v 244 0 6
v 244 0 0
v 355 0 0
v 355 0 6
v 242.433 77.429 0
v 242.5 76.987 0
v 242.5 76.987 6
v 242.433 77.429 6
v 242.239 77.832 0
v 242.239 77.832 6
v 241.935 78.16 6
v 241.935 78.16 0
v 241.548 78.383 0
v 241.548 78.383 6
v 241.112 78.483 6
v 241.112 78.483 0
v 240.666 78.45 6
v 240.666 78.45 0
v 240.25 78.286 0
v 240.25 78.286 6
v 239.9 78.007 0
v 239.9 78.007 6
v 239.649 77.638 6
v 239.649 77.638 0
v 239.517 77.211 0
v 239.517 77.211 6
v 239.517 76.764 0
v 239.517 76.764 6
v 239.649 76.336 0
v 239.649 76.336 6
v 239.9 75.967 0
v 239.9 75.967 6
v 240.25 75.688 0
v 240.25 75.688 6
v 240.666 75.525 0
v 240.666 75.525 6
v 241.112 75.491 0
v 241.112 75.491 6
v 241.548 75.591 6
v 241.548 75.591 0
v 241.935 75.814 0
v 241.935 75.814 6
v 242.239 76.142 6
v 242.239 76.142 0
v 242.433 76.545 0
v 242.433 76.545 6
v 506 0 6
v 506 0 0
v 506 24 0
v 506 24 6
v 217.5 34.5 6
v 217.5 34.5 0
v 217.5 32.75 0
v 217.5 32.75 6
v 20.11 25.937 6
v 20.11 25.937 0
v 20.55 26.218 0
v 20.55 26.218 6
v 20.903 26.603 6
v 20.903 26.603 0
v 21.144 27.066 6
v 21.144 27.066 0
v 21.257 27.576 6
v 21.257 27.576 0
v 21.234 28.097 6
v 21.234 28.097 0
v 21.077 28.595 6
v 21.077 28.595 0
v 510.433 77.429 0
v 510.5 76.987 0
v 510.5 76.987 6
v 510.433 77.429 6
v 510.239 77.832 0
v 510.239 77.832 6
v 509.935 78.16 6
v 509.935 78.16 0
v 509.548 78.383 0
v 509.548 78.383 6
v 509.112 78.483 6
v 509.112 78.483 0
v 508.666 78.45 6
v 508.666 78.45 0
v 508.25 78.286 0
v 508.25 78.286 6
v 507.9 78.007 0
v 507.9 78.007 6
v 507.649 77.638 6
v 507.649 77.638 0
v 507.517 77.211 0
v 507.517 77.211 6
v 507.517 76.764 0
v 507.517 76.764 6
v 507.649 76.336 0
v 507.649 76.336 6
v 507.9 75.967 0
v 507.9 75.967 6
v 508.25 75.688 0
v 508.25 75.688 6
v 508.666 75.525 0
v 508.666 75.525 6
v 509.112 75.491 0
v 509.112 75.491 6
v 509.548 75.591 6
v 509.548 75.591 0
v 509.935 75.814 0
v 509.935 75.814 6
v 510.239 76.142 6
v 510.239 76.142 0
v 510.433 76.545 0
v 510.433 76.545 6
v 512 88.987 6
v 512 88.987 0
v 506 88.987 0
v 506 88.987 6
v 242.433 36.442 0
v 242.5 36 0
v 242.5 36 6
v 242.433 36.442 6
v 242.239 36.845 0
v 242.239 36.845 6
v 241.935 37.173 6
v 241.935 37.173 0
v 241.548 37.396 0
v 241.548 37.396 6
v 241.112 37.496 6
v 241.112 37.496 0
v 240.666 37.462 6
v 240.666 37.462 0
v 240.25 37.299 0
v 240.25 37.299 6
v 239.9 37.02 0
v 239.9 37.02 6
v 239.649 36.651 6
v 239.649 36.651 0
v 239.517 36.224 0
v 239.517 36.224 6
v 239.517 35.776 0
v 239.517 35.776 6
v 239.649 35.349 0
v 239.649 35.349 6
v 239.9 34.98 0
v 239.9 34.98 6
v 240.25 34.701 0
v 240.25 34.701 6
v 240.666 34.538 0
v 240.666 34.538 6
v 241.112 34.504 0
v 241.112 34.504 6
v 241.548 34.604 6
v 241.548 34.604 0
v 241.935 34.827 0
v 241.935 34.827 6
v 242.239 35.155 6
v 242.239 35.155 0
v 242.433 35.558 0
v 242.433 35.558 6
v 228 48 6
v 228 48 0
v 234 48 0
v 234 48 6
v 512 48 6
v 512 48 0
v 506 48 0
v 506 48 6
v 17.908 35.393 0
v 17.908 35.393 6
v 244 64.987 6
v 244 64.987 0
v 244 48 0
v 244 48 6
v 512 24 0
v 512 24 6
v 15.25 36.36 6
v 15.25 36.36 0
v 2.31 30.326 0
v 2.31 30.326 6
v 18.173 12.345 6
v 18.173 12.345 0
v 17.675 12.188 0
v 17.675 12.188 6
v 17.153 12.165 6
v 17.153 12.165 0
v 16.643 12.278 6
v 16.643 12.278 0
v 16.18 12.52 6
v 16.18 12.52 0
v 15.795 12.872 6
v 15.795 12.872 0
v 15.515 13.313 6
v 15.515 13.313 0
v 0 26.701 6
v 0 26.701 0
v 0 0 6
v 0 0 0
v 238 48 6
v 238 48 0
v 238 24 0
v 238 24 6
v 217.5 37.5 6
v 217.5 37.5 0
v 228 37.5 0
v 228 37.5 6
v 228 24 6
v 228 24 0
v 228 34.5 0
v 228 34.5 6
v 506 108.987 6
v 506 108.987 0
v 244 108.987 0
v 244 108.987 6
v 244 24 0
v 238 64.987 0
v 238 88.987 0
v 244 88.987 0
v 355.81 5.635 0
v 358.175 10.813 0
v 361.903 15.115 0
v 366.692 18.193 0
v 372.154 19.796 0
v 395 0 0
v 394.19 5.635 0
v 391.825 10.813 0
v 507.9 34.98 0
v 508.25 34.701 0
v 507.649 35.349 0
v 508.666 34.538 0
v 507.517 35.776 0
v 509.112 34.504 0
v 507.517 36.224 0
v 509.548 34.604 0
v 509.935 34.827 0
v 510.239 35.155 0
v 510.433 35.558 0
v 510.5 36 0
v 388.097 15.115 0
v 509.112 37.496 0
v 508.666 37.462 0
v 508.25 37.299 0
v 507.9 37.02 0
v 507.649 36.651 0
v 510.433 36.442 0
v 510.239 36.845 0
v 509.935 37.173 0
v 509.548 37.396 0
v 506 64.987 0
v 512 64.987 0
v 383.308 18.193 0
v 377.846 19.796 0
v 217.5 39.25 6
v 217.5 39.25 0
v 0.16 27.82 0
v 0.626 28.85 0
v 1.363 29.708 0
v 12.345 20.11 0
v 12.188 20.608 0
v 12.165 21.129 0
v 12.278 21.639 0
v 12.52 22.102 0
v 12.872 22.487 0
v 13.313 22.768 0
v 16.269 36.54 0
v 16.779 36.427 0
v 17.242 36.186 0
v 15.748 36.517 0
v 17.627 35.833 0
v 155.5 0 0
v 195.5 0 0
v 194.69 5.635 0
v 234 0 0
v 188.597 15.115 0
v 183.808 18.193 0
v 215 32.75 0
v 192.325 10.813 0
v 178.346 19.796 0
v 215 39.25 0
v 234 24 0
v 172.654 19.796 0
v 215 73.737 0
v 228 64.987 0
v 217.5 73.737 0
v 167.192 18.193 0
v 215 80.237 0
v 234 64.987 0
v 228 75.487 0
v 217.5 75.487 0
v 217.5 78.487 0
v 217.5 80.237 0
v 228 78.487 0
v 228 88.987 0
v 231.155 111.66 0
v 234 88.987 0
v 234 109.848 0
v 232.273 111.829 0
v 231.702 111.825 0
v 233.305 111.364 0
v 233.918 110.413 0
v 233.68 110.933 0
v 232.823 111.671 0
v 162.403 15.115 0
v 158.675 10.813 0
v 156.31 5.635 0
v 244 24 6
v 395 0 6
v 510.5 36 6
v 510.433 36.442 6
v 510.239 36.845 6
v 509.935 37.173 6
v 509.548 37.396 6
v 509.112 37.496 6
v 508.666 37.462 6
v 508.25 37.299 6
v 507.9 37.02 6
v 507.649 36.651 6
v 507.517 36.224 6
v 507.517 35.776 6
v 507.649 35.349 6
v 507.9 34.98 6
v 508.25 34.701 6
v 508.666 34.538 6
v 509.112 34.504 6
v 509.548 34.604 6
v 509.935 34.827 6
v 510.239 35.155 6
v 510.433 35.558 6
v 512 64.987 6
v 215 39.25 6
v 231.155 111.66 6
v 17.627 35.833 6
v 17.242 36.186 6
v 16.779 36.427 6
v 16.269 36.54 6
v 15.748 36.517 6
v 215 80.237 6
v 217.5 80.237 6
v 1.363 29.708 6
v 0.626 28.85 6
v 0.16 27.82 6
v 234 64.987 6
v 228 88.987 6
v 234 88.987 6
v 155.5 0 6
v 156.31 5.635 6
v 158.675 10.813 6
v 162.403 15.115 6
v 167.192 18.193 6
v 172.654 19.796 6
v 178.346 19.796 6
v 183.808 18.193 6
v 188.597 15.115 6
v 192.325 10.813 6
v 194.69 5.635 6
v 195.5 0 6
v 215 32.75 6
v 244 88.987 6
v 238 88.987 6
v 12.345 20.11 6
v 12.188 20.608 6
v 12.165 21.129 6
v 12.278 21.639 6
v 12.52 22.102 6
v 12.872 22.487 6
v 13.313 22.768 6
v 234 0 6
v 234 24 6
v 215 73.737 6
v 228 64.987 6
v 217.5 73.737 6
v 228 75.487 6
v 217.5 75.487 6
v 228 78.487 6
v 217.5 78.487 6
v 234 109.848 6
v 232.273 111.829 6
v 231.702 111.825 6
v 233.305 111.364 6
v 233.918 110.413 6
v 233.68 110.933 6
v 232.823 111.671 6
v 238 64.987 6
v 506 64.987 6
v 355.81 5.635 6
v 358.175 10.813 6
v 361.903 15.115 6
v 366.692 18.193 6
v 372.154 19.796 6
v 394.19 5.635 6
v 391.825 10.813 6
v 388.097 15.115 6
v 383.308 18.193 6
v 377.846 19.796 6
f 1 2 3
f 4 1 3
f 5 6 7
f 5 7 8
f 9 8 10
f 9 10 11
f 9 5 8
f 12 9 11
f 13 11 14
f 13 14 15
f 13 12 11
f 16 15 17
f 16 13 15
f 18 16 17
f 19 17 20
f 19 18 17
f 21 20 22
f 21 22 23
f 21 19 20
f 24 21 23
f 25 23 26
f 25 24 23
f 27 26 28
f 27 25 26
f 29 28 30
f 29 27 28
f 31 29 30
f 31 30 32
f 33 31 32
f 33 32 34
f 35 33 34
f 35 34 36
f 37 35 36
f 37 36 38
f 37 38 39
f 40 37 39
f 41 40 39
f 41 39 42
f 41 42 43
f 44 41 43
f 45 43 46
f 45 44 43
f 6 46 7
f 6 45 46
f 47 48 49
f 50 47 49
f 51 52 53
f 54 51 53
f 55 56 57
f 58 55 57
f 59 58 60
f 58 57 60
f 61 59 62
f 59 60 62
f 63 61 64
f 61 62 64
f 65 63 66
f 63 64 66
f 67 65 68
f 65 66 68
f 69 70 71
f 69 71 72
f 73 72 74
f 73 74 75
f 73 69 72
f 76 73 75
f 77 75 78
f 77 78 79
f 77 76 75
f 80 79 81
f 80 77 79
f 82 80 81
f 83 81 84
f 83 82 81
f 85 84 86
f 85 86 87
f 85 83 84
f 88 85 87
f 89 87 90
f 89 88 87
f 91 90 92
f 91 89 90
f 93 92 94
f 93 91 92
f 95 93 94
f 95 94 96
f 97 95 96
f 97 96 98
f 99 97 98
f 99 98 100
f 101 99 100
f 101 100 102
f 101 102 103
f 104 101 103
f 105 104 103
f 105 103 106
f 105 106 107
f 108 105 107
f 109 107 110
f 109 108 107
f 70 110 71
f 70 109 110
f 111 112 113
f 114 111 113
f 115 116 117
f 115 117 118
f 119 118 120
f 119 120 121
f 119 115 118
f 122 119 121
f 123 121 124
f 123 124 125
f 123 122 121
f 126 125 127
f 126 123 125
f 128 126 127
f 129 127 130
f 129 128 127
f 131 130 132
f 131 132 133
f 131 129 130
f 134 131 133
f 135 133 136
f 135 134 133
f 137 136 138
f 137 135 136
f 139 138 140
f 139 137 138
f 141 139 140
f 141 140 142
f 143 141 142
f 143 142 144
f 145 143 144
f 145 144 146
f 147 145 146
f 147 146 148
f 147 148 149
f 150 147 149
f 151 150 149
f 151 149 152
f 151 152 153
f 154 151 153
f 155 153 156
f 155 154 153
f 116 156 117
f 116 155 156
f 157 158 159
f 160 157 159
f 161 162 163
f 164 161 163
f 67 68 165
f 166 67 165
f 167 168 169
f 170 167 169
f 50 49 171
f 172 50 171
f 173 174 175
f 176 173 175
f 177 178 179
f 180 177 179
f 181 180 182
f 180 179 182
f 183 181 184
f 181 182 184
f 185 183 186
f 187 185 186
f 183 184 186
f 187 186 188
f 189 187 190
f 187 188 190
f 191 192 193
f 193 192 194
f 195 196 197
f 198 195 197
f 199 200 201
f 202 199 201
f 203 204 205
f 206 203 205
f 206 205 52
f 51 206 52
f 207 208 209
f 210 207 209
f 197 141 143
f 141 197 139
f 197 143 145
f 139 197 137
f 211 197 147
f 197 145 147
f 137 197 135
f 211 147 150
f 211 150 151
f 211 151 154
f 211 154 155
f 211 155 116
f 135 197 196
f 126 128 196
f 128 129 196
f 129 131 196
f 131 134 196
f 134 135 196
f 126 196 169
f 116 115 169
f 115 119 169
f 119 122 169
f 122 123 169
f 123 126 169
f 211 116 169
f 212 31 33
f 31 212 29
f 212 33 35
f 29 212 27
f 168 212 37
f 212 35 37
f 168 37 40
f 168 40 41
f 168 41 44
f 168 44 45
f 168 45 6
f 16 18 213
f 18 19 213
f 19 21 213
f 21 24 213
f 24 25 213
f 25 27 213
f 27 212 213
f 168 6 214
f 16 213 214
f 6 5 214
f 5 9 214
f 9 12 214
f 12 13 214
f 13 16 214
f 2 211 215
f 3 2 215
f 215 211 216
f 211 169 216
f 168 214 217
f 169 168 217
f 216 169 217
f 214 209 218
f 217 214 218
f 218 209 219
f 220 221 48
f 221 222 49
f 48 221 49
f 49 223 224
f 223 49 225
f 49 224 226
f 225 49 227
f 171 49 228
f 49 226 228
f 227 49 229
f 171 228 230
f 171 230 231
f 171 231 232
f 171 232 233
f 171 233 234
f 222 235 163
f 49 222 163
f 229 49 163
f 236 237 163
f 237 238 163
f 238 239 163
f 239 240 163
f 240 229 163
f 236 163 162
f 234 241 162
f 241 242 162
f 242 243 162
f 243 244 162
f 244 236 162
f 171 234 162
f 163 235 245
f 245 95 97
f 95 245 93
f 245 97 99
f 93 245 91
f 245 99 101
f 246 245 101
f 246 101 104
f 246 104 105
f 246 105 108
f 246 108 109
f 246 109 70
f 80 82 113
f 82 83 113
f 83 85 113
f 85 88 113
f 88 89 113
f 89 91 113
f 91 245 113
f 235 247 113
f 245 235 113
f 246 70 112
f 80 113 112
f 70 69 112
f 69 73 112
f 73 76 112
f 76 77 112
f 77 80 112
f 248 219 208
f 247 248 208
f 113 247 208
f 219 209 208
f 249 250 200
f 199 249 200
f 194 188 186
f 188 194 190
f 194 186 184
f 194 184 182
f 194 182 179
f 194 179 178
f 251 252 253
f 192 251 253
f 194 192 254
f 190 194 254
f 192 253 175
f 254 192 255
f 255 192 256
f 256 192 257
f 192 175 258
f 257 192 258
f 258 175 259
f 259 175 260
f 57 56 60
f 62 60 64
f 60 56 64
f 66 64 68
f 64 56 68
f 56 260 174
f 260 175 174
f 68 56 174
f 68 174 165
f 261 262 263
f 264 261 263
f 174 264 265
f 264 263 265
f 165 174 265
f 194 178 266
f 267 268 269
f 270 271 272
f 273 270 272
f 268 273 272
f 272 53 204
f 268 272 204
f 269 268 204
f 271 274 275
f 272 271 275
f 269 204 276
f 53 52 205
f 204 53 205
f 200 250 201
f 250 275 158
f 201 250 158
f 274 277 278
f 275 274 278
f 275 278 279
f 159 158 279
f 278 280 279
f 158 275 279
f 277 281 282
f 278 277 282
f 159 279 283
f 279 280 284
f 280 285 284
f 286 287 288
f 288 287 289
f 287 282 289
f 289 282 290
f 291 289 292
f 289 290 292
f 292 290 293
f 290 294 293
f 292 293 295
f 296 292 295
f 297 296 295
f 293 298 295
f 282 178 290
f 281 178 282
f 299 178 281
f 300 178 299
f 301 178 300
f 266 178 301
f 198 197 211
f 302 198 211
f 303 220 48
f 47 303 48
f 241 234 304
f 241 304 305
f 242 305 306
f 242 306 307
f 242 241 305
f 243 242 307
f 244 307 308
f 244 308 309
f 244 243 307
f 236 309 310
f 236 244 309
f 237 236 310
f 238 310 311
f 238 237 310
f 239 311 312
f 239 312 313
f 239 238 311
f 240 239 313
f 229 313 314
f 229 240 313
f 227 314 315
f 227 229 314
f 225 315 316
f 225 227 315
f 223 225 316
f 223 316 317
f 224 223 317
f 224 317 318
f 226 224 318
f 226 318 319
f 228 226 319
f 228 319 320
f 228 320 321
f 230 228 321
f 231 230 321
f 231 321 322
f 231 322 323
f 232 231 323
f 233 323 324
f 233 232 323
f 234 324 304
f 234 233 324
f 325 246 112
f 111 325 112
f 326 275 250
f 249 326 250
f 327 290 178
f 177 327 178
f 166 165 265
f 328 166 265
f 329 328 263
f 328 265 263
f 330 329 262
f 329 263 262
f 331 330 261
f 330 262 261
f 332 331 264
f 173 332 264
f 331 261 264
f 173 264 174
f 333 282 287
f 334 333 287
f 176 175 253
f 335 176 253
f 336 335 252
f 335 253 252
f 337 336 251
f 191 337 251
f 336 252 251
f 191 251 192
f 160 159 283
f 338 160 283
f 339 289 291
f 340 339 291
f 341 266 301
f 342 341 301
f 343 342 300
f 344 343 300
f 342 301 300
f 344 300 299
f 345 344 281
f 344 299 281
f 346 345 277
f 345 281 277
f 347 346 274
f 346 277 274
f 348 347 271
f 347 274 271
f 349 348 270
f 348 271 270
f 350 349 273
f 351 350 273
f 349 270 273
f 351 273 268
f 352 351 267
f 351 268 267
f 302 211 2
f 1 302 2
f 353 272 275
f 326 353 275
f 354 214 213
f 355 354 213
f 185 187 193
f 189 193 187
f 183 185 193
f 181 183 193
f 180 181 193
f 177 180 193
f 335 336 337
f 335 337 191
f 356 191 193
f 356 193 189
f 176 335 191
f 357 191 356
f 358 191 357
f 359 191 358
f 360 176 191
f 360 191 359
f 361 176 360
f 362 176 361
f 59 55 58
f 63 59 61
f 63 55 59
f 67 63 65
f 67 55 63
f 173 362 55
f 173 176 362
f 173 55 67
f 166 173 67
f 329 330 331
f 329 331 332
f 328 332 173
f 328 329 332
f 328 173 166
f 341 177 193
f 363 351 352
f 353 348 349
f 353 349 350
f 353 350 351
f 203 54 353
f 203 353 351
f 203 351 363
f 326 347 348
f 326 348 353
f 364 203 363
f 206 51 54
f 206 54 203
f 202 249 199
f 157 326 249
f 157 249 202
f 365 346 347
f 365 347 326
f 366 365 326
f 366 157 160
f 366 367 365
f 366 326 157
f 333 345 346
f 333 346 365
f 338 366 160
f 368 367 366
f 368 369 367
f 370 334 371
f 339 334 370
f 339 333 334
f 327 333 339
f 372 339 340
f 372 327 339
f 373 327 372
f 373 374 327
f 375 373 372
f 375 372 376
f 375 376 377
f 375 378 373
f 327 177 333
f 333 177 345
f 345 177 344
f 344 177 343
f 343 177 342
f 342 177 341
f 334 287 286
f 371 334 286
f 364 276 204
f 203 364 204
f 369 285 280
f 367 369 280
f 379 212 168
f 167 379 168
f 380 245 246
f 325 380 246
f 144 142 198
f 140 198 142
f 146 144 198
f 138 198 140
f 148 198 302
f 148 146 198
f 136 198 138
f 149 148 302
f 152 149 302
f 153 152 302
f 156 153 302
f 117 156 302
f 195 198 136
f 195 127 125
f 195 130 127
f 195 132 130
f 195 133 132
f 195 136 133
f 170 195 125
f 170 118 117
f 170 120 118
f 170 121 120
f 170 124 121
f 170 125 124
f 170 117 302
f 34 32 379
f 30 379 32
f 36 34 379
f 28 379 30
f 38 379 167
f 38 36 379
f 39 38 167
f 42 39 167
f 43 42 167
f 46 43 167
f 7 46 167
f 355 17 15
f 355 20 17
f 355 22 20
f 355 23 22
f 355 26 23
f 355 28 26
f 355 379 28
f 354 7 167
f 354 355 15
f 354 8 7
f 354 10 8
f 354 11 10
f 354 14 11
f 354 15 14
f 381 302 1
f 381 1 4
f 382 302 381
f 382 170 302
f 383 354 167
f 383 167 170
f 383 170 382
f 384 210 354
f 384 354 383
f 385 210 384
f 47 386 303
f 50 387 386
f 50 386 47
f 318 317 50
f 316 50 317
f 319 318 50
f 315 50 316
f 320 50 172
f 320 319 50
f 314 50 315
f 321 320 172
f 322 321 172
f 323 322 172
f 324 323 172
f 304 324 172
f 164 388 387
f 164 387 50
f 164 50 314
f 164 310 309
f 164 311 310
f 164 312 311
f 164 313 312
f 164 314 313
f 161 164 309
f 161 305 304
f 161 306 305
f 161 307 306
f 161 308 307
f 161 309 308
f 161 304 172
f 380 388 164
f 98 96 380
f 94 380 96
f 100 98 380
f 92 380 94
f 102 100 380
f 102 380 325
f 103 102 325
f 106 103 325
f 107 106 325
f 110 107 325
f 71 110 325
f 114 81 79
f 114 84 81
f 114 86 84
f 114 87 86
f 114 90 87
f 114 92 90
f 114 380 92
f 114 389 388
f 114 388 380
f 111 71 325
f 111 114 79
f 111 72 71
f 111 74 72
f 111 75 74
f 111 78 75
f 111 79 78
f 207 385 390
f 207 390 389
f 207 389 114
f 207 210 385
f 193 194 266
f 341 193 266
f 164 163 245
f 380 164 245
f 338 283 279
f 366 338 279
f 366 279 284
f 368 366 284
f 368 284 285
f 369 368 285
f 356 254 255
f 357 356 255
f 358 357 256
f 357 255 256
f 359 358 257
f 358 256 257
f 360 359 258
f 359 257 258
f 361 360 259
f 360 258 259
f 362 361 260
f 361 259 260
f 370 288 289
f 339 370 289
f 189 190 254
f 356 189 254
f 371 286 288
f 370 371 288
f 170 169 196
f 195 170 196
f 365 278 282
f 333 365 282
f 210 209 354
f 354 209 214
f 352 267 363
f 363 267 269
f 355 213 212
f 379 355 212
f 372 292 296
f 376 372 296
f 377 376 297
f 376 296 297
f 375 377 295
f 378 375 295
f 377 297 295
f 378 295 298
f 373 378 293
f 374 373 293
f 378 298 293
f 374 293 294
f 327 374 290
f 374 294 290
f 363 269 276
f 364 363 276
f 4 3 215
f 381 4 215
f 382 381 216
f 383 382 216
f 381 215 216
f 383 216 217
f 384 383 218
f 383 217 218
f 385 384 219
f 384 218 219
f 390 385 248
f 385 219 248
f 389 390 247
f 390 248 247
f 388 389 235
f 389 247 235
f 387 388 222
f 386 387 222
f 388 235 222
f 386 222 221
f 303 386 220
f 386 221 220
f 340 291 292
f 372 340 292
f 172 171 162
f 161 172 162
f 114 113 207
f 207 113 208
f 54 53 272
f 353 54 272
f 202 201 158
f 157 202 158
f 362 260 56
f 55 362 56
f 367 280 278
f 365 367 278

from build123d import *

# Parameters (mm, degrees)
F2_DEPTH = 6
F1_R     = 1.5


with BuildPart() as f2:
    # F1 (on Top) → F2 (new body)
    with BuildSketch(Plane.XY):
        with BuildLine():
            Line((13.3126155741, 22.7677760744), (20.1099239768, 25.9374130375))
            ThreePointArc((20.1099239768, 25.9374130375), (21.1440726949, 27.0659883249), (21.0773030274, 28.595265135))
            Line((21.0773030274, 28.595265135), (17.9076660644, 35.3925735378))
            ThreePointArc((17.9076660644, 35.3925735378), (16.779090777, 36.4267222559), (15.2498139668, 36.3599525884))
            Line((15.2498139668, 36.3599525884), (2.309526953, 30.3257976551))
            ThreePointArc((2.309526953, 30.3257976551), (0.6264342167, 28.8497649404), (0, 26.700566507))
            Line((0, 26.700566507), (0, 0))
            Line((0, 0), (155.5, 0))
            ThreePointArc((155.5, 0), (175.5, 20), (195.5, 0))
            Line((195.5, 0), (234, 0))
            Line((234, 0), (234, 24))
            Line((234, 24), (228, 24))
            Line((228, 24), (228, 34.5))
            Line((228, 34.5), (217.5, 34.5))
            Line((217.5, 34.5), (217.5, 32.75))
            Line((217.5, 32.75), (215, 32.75))
            Line((215, 32.75), (215, 36))
            Line((215, 36), (215, 39.25))
            Line((215, 39.25), (217.5, 39.25))
            Line((217.5, 39.25), (217.5, 37.5))
            Line((217.5, 37.5), (228, 37.5))
            Line((228, 37.5), (228, 48))
            Line((228, 48), (234, 48))
            Line((234, 48), (234, 64.9871474223))
            Line((234, 64.9871474223), (228, 64.9871474223))
            Line((228, 64.9871474223), (228, 75.4871474223))
            Line((228, 75.4871474223), (217.5, 75.4871474223))
            Line((217.5, 75.4871474223), (217.5, 73.7371474223))
            Line((217.5, 73.7371474223), (215, 73.7371474223))
            Line((215, 73.7371474223), (215, 76.9871474223))
            Line((215, 76.9871474223), (215, 80.2371474223))
            Line((215, 80.2371474223), (217.5, 80.2371474223))
            Line((217.5, 80.2371474223), (217.5, 78.4871474223))
            Line((217.5, 78.4871474223), (228, 78.4871474223))
            Line((228, 78.4871474223), (228, 88.9871474223))
            Line((228, 88.9871474223), (234, 88.9871474223))
            Line((234, 88.9871474223), (234, 109.8477762681))
            ThreePointArc((234, 109.8477762681), (233.0745992167, 111.5345591597), (231.1547634765, 111.6603918422))
            Line((231.1547634765, 111.6603918422), (18.1727255841, 12.3452365235))
            ThreePointArc((18.1727255841, 12.3452365235), (16.643448774, 12.278466856), (15.5148734865, 13.3126155741))
            Line((15.5148734865, 13.3126155741), (12.3452365235, 20.1099239768))
            ThreePointArc((12.3452365235, 20.1099239768), (12.278466856, 21.639200787), (13.3126155741, 22.7677760744))
        make_face()
    extrude(amount=F2_DEPTH)


with BuildPart() as f2b:
    # F1 (on Top) → F2, piece 2 (new body)
    with BuildSketch(Plane.XY):
        with BuildLine():
            Line((506, 108.9871474223), (244, 108.9871474223))
            Line((244, 108.9871474223), (244, 88.9871474223))
            Line((244, 88.9871474223), (238, 88.9871474223))
            Line((238, 88.9871474223), (238, 64.9871474223))
            Line((238, 64.9871474223), (244, 64.9871474223))
            Line((244, 64.9871474223), (244, 48))
            Line((244, 48), (238, 48))
            Line((238, 48), (238, 24))
            Line((238, 24), (244, 24))
            Line((244, 24), (244, 0))
            Line((244, 0), (355, 0))
            ThreePointArc((355, 0), (375, 20), (395, 0))
            Line((395, 0), (506, 0))
            Line((506, 0), (506, 24))
            Line((506, 24), (512, 24))
            Line((512, 24), (512, 48))
            Line((512, 48), (506, 48))
            Line((506, 48), (506, 64.9871474223))
            Line((506, 64.9871474223), (512, 64.9871474223))
            Line((512, 64.9871474223), (512, 88.9871474223))
            Line((512, 88.9871474223), (506, 88.9871474223))
            Line((506, 88.9871474223), (506, 108.9871474223))
        make_face()
        with Locations((241, 36)):
            Circle(F1_R, mode=Mode.SUBTRACT)
        with Locations((509, 36)):
            Circle(F1_R, mode=Mode.SUBTRACT)
        with Locations((241, 76.9871474223)):
            Circle(F1_R, mode=Mode.SUBTRACT)
        with Locations((509, 76.9871474223)):
            Circle(F1_R, mode=Mode.SUBTRACT)
    extrude(amount=F2_DEPTH)


solid = Compound([f2.part, f2b.part])
